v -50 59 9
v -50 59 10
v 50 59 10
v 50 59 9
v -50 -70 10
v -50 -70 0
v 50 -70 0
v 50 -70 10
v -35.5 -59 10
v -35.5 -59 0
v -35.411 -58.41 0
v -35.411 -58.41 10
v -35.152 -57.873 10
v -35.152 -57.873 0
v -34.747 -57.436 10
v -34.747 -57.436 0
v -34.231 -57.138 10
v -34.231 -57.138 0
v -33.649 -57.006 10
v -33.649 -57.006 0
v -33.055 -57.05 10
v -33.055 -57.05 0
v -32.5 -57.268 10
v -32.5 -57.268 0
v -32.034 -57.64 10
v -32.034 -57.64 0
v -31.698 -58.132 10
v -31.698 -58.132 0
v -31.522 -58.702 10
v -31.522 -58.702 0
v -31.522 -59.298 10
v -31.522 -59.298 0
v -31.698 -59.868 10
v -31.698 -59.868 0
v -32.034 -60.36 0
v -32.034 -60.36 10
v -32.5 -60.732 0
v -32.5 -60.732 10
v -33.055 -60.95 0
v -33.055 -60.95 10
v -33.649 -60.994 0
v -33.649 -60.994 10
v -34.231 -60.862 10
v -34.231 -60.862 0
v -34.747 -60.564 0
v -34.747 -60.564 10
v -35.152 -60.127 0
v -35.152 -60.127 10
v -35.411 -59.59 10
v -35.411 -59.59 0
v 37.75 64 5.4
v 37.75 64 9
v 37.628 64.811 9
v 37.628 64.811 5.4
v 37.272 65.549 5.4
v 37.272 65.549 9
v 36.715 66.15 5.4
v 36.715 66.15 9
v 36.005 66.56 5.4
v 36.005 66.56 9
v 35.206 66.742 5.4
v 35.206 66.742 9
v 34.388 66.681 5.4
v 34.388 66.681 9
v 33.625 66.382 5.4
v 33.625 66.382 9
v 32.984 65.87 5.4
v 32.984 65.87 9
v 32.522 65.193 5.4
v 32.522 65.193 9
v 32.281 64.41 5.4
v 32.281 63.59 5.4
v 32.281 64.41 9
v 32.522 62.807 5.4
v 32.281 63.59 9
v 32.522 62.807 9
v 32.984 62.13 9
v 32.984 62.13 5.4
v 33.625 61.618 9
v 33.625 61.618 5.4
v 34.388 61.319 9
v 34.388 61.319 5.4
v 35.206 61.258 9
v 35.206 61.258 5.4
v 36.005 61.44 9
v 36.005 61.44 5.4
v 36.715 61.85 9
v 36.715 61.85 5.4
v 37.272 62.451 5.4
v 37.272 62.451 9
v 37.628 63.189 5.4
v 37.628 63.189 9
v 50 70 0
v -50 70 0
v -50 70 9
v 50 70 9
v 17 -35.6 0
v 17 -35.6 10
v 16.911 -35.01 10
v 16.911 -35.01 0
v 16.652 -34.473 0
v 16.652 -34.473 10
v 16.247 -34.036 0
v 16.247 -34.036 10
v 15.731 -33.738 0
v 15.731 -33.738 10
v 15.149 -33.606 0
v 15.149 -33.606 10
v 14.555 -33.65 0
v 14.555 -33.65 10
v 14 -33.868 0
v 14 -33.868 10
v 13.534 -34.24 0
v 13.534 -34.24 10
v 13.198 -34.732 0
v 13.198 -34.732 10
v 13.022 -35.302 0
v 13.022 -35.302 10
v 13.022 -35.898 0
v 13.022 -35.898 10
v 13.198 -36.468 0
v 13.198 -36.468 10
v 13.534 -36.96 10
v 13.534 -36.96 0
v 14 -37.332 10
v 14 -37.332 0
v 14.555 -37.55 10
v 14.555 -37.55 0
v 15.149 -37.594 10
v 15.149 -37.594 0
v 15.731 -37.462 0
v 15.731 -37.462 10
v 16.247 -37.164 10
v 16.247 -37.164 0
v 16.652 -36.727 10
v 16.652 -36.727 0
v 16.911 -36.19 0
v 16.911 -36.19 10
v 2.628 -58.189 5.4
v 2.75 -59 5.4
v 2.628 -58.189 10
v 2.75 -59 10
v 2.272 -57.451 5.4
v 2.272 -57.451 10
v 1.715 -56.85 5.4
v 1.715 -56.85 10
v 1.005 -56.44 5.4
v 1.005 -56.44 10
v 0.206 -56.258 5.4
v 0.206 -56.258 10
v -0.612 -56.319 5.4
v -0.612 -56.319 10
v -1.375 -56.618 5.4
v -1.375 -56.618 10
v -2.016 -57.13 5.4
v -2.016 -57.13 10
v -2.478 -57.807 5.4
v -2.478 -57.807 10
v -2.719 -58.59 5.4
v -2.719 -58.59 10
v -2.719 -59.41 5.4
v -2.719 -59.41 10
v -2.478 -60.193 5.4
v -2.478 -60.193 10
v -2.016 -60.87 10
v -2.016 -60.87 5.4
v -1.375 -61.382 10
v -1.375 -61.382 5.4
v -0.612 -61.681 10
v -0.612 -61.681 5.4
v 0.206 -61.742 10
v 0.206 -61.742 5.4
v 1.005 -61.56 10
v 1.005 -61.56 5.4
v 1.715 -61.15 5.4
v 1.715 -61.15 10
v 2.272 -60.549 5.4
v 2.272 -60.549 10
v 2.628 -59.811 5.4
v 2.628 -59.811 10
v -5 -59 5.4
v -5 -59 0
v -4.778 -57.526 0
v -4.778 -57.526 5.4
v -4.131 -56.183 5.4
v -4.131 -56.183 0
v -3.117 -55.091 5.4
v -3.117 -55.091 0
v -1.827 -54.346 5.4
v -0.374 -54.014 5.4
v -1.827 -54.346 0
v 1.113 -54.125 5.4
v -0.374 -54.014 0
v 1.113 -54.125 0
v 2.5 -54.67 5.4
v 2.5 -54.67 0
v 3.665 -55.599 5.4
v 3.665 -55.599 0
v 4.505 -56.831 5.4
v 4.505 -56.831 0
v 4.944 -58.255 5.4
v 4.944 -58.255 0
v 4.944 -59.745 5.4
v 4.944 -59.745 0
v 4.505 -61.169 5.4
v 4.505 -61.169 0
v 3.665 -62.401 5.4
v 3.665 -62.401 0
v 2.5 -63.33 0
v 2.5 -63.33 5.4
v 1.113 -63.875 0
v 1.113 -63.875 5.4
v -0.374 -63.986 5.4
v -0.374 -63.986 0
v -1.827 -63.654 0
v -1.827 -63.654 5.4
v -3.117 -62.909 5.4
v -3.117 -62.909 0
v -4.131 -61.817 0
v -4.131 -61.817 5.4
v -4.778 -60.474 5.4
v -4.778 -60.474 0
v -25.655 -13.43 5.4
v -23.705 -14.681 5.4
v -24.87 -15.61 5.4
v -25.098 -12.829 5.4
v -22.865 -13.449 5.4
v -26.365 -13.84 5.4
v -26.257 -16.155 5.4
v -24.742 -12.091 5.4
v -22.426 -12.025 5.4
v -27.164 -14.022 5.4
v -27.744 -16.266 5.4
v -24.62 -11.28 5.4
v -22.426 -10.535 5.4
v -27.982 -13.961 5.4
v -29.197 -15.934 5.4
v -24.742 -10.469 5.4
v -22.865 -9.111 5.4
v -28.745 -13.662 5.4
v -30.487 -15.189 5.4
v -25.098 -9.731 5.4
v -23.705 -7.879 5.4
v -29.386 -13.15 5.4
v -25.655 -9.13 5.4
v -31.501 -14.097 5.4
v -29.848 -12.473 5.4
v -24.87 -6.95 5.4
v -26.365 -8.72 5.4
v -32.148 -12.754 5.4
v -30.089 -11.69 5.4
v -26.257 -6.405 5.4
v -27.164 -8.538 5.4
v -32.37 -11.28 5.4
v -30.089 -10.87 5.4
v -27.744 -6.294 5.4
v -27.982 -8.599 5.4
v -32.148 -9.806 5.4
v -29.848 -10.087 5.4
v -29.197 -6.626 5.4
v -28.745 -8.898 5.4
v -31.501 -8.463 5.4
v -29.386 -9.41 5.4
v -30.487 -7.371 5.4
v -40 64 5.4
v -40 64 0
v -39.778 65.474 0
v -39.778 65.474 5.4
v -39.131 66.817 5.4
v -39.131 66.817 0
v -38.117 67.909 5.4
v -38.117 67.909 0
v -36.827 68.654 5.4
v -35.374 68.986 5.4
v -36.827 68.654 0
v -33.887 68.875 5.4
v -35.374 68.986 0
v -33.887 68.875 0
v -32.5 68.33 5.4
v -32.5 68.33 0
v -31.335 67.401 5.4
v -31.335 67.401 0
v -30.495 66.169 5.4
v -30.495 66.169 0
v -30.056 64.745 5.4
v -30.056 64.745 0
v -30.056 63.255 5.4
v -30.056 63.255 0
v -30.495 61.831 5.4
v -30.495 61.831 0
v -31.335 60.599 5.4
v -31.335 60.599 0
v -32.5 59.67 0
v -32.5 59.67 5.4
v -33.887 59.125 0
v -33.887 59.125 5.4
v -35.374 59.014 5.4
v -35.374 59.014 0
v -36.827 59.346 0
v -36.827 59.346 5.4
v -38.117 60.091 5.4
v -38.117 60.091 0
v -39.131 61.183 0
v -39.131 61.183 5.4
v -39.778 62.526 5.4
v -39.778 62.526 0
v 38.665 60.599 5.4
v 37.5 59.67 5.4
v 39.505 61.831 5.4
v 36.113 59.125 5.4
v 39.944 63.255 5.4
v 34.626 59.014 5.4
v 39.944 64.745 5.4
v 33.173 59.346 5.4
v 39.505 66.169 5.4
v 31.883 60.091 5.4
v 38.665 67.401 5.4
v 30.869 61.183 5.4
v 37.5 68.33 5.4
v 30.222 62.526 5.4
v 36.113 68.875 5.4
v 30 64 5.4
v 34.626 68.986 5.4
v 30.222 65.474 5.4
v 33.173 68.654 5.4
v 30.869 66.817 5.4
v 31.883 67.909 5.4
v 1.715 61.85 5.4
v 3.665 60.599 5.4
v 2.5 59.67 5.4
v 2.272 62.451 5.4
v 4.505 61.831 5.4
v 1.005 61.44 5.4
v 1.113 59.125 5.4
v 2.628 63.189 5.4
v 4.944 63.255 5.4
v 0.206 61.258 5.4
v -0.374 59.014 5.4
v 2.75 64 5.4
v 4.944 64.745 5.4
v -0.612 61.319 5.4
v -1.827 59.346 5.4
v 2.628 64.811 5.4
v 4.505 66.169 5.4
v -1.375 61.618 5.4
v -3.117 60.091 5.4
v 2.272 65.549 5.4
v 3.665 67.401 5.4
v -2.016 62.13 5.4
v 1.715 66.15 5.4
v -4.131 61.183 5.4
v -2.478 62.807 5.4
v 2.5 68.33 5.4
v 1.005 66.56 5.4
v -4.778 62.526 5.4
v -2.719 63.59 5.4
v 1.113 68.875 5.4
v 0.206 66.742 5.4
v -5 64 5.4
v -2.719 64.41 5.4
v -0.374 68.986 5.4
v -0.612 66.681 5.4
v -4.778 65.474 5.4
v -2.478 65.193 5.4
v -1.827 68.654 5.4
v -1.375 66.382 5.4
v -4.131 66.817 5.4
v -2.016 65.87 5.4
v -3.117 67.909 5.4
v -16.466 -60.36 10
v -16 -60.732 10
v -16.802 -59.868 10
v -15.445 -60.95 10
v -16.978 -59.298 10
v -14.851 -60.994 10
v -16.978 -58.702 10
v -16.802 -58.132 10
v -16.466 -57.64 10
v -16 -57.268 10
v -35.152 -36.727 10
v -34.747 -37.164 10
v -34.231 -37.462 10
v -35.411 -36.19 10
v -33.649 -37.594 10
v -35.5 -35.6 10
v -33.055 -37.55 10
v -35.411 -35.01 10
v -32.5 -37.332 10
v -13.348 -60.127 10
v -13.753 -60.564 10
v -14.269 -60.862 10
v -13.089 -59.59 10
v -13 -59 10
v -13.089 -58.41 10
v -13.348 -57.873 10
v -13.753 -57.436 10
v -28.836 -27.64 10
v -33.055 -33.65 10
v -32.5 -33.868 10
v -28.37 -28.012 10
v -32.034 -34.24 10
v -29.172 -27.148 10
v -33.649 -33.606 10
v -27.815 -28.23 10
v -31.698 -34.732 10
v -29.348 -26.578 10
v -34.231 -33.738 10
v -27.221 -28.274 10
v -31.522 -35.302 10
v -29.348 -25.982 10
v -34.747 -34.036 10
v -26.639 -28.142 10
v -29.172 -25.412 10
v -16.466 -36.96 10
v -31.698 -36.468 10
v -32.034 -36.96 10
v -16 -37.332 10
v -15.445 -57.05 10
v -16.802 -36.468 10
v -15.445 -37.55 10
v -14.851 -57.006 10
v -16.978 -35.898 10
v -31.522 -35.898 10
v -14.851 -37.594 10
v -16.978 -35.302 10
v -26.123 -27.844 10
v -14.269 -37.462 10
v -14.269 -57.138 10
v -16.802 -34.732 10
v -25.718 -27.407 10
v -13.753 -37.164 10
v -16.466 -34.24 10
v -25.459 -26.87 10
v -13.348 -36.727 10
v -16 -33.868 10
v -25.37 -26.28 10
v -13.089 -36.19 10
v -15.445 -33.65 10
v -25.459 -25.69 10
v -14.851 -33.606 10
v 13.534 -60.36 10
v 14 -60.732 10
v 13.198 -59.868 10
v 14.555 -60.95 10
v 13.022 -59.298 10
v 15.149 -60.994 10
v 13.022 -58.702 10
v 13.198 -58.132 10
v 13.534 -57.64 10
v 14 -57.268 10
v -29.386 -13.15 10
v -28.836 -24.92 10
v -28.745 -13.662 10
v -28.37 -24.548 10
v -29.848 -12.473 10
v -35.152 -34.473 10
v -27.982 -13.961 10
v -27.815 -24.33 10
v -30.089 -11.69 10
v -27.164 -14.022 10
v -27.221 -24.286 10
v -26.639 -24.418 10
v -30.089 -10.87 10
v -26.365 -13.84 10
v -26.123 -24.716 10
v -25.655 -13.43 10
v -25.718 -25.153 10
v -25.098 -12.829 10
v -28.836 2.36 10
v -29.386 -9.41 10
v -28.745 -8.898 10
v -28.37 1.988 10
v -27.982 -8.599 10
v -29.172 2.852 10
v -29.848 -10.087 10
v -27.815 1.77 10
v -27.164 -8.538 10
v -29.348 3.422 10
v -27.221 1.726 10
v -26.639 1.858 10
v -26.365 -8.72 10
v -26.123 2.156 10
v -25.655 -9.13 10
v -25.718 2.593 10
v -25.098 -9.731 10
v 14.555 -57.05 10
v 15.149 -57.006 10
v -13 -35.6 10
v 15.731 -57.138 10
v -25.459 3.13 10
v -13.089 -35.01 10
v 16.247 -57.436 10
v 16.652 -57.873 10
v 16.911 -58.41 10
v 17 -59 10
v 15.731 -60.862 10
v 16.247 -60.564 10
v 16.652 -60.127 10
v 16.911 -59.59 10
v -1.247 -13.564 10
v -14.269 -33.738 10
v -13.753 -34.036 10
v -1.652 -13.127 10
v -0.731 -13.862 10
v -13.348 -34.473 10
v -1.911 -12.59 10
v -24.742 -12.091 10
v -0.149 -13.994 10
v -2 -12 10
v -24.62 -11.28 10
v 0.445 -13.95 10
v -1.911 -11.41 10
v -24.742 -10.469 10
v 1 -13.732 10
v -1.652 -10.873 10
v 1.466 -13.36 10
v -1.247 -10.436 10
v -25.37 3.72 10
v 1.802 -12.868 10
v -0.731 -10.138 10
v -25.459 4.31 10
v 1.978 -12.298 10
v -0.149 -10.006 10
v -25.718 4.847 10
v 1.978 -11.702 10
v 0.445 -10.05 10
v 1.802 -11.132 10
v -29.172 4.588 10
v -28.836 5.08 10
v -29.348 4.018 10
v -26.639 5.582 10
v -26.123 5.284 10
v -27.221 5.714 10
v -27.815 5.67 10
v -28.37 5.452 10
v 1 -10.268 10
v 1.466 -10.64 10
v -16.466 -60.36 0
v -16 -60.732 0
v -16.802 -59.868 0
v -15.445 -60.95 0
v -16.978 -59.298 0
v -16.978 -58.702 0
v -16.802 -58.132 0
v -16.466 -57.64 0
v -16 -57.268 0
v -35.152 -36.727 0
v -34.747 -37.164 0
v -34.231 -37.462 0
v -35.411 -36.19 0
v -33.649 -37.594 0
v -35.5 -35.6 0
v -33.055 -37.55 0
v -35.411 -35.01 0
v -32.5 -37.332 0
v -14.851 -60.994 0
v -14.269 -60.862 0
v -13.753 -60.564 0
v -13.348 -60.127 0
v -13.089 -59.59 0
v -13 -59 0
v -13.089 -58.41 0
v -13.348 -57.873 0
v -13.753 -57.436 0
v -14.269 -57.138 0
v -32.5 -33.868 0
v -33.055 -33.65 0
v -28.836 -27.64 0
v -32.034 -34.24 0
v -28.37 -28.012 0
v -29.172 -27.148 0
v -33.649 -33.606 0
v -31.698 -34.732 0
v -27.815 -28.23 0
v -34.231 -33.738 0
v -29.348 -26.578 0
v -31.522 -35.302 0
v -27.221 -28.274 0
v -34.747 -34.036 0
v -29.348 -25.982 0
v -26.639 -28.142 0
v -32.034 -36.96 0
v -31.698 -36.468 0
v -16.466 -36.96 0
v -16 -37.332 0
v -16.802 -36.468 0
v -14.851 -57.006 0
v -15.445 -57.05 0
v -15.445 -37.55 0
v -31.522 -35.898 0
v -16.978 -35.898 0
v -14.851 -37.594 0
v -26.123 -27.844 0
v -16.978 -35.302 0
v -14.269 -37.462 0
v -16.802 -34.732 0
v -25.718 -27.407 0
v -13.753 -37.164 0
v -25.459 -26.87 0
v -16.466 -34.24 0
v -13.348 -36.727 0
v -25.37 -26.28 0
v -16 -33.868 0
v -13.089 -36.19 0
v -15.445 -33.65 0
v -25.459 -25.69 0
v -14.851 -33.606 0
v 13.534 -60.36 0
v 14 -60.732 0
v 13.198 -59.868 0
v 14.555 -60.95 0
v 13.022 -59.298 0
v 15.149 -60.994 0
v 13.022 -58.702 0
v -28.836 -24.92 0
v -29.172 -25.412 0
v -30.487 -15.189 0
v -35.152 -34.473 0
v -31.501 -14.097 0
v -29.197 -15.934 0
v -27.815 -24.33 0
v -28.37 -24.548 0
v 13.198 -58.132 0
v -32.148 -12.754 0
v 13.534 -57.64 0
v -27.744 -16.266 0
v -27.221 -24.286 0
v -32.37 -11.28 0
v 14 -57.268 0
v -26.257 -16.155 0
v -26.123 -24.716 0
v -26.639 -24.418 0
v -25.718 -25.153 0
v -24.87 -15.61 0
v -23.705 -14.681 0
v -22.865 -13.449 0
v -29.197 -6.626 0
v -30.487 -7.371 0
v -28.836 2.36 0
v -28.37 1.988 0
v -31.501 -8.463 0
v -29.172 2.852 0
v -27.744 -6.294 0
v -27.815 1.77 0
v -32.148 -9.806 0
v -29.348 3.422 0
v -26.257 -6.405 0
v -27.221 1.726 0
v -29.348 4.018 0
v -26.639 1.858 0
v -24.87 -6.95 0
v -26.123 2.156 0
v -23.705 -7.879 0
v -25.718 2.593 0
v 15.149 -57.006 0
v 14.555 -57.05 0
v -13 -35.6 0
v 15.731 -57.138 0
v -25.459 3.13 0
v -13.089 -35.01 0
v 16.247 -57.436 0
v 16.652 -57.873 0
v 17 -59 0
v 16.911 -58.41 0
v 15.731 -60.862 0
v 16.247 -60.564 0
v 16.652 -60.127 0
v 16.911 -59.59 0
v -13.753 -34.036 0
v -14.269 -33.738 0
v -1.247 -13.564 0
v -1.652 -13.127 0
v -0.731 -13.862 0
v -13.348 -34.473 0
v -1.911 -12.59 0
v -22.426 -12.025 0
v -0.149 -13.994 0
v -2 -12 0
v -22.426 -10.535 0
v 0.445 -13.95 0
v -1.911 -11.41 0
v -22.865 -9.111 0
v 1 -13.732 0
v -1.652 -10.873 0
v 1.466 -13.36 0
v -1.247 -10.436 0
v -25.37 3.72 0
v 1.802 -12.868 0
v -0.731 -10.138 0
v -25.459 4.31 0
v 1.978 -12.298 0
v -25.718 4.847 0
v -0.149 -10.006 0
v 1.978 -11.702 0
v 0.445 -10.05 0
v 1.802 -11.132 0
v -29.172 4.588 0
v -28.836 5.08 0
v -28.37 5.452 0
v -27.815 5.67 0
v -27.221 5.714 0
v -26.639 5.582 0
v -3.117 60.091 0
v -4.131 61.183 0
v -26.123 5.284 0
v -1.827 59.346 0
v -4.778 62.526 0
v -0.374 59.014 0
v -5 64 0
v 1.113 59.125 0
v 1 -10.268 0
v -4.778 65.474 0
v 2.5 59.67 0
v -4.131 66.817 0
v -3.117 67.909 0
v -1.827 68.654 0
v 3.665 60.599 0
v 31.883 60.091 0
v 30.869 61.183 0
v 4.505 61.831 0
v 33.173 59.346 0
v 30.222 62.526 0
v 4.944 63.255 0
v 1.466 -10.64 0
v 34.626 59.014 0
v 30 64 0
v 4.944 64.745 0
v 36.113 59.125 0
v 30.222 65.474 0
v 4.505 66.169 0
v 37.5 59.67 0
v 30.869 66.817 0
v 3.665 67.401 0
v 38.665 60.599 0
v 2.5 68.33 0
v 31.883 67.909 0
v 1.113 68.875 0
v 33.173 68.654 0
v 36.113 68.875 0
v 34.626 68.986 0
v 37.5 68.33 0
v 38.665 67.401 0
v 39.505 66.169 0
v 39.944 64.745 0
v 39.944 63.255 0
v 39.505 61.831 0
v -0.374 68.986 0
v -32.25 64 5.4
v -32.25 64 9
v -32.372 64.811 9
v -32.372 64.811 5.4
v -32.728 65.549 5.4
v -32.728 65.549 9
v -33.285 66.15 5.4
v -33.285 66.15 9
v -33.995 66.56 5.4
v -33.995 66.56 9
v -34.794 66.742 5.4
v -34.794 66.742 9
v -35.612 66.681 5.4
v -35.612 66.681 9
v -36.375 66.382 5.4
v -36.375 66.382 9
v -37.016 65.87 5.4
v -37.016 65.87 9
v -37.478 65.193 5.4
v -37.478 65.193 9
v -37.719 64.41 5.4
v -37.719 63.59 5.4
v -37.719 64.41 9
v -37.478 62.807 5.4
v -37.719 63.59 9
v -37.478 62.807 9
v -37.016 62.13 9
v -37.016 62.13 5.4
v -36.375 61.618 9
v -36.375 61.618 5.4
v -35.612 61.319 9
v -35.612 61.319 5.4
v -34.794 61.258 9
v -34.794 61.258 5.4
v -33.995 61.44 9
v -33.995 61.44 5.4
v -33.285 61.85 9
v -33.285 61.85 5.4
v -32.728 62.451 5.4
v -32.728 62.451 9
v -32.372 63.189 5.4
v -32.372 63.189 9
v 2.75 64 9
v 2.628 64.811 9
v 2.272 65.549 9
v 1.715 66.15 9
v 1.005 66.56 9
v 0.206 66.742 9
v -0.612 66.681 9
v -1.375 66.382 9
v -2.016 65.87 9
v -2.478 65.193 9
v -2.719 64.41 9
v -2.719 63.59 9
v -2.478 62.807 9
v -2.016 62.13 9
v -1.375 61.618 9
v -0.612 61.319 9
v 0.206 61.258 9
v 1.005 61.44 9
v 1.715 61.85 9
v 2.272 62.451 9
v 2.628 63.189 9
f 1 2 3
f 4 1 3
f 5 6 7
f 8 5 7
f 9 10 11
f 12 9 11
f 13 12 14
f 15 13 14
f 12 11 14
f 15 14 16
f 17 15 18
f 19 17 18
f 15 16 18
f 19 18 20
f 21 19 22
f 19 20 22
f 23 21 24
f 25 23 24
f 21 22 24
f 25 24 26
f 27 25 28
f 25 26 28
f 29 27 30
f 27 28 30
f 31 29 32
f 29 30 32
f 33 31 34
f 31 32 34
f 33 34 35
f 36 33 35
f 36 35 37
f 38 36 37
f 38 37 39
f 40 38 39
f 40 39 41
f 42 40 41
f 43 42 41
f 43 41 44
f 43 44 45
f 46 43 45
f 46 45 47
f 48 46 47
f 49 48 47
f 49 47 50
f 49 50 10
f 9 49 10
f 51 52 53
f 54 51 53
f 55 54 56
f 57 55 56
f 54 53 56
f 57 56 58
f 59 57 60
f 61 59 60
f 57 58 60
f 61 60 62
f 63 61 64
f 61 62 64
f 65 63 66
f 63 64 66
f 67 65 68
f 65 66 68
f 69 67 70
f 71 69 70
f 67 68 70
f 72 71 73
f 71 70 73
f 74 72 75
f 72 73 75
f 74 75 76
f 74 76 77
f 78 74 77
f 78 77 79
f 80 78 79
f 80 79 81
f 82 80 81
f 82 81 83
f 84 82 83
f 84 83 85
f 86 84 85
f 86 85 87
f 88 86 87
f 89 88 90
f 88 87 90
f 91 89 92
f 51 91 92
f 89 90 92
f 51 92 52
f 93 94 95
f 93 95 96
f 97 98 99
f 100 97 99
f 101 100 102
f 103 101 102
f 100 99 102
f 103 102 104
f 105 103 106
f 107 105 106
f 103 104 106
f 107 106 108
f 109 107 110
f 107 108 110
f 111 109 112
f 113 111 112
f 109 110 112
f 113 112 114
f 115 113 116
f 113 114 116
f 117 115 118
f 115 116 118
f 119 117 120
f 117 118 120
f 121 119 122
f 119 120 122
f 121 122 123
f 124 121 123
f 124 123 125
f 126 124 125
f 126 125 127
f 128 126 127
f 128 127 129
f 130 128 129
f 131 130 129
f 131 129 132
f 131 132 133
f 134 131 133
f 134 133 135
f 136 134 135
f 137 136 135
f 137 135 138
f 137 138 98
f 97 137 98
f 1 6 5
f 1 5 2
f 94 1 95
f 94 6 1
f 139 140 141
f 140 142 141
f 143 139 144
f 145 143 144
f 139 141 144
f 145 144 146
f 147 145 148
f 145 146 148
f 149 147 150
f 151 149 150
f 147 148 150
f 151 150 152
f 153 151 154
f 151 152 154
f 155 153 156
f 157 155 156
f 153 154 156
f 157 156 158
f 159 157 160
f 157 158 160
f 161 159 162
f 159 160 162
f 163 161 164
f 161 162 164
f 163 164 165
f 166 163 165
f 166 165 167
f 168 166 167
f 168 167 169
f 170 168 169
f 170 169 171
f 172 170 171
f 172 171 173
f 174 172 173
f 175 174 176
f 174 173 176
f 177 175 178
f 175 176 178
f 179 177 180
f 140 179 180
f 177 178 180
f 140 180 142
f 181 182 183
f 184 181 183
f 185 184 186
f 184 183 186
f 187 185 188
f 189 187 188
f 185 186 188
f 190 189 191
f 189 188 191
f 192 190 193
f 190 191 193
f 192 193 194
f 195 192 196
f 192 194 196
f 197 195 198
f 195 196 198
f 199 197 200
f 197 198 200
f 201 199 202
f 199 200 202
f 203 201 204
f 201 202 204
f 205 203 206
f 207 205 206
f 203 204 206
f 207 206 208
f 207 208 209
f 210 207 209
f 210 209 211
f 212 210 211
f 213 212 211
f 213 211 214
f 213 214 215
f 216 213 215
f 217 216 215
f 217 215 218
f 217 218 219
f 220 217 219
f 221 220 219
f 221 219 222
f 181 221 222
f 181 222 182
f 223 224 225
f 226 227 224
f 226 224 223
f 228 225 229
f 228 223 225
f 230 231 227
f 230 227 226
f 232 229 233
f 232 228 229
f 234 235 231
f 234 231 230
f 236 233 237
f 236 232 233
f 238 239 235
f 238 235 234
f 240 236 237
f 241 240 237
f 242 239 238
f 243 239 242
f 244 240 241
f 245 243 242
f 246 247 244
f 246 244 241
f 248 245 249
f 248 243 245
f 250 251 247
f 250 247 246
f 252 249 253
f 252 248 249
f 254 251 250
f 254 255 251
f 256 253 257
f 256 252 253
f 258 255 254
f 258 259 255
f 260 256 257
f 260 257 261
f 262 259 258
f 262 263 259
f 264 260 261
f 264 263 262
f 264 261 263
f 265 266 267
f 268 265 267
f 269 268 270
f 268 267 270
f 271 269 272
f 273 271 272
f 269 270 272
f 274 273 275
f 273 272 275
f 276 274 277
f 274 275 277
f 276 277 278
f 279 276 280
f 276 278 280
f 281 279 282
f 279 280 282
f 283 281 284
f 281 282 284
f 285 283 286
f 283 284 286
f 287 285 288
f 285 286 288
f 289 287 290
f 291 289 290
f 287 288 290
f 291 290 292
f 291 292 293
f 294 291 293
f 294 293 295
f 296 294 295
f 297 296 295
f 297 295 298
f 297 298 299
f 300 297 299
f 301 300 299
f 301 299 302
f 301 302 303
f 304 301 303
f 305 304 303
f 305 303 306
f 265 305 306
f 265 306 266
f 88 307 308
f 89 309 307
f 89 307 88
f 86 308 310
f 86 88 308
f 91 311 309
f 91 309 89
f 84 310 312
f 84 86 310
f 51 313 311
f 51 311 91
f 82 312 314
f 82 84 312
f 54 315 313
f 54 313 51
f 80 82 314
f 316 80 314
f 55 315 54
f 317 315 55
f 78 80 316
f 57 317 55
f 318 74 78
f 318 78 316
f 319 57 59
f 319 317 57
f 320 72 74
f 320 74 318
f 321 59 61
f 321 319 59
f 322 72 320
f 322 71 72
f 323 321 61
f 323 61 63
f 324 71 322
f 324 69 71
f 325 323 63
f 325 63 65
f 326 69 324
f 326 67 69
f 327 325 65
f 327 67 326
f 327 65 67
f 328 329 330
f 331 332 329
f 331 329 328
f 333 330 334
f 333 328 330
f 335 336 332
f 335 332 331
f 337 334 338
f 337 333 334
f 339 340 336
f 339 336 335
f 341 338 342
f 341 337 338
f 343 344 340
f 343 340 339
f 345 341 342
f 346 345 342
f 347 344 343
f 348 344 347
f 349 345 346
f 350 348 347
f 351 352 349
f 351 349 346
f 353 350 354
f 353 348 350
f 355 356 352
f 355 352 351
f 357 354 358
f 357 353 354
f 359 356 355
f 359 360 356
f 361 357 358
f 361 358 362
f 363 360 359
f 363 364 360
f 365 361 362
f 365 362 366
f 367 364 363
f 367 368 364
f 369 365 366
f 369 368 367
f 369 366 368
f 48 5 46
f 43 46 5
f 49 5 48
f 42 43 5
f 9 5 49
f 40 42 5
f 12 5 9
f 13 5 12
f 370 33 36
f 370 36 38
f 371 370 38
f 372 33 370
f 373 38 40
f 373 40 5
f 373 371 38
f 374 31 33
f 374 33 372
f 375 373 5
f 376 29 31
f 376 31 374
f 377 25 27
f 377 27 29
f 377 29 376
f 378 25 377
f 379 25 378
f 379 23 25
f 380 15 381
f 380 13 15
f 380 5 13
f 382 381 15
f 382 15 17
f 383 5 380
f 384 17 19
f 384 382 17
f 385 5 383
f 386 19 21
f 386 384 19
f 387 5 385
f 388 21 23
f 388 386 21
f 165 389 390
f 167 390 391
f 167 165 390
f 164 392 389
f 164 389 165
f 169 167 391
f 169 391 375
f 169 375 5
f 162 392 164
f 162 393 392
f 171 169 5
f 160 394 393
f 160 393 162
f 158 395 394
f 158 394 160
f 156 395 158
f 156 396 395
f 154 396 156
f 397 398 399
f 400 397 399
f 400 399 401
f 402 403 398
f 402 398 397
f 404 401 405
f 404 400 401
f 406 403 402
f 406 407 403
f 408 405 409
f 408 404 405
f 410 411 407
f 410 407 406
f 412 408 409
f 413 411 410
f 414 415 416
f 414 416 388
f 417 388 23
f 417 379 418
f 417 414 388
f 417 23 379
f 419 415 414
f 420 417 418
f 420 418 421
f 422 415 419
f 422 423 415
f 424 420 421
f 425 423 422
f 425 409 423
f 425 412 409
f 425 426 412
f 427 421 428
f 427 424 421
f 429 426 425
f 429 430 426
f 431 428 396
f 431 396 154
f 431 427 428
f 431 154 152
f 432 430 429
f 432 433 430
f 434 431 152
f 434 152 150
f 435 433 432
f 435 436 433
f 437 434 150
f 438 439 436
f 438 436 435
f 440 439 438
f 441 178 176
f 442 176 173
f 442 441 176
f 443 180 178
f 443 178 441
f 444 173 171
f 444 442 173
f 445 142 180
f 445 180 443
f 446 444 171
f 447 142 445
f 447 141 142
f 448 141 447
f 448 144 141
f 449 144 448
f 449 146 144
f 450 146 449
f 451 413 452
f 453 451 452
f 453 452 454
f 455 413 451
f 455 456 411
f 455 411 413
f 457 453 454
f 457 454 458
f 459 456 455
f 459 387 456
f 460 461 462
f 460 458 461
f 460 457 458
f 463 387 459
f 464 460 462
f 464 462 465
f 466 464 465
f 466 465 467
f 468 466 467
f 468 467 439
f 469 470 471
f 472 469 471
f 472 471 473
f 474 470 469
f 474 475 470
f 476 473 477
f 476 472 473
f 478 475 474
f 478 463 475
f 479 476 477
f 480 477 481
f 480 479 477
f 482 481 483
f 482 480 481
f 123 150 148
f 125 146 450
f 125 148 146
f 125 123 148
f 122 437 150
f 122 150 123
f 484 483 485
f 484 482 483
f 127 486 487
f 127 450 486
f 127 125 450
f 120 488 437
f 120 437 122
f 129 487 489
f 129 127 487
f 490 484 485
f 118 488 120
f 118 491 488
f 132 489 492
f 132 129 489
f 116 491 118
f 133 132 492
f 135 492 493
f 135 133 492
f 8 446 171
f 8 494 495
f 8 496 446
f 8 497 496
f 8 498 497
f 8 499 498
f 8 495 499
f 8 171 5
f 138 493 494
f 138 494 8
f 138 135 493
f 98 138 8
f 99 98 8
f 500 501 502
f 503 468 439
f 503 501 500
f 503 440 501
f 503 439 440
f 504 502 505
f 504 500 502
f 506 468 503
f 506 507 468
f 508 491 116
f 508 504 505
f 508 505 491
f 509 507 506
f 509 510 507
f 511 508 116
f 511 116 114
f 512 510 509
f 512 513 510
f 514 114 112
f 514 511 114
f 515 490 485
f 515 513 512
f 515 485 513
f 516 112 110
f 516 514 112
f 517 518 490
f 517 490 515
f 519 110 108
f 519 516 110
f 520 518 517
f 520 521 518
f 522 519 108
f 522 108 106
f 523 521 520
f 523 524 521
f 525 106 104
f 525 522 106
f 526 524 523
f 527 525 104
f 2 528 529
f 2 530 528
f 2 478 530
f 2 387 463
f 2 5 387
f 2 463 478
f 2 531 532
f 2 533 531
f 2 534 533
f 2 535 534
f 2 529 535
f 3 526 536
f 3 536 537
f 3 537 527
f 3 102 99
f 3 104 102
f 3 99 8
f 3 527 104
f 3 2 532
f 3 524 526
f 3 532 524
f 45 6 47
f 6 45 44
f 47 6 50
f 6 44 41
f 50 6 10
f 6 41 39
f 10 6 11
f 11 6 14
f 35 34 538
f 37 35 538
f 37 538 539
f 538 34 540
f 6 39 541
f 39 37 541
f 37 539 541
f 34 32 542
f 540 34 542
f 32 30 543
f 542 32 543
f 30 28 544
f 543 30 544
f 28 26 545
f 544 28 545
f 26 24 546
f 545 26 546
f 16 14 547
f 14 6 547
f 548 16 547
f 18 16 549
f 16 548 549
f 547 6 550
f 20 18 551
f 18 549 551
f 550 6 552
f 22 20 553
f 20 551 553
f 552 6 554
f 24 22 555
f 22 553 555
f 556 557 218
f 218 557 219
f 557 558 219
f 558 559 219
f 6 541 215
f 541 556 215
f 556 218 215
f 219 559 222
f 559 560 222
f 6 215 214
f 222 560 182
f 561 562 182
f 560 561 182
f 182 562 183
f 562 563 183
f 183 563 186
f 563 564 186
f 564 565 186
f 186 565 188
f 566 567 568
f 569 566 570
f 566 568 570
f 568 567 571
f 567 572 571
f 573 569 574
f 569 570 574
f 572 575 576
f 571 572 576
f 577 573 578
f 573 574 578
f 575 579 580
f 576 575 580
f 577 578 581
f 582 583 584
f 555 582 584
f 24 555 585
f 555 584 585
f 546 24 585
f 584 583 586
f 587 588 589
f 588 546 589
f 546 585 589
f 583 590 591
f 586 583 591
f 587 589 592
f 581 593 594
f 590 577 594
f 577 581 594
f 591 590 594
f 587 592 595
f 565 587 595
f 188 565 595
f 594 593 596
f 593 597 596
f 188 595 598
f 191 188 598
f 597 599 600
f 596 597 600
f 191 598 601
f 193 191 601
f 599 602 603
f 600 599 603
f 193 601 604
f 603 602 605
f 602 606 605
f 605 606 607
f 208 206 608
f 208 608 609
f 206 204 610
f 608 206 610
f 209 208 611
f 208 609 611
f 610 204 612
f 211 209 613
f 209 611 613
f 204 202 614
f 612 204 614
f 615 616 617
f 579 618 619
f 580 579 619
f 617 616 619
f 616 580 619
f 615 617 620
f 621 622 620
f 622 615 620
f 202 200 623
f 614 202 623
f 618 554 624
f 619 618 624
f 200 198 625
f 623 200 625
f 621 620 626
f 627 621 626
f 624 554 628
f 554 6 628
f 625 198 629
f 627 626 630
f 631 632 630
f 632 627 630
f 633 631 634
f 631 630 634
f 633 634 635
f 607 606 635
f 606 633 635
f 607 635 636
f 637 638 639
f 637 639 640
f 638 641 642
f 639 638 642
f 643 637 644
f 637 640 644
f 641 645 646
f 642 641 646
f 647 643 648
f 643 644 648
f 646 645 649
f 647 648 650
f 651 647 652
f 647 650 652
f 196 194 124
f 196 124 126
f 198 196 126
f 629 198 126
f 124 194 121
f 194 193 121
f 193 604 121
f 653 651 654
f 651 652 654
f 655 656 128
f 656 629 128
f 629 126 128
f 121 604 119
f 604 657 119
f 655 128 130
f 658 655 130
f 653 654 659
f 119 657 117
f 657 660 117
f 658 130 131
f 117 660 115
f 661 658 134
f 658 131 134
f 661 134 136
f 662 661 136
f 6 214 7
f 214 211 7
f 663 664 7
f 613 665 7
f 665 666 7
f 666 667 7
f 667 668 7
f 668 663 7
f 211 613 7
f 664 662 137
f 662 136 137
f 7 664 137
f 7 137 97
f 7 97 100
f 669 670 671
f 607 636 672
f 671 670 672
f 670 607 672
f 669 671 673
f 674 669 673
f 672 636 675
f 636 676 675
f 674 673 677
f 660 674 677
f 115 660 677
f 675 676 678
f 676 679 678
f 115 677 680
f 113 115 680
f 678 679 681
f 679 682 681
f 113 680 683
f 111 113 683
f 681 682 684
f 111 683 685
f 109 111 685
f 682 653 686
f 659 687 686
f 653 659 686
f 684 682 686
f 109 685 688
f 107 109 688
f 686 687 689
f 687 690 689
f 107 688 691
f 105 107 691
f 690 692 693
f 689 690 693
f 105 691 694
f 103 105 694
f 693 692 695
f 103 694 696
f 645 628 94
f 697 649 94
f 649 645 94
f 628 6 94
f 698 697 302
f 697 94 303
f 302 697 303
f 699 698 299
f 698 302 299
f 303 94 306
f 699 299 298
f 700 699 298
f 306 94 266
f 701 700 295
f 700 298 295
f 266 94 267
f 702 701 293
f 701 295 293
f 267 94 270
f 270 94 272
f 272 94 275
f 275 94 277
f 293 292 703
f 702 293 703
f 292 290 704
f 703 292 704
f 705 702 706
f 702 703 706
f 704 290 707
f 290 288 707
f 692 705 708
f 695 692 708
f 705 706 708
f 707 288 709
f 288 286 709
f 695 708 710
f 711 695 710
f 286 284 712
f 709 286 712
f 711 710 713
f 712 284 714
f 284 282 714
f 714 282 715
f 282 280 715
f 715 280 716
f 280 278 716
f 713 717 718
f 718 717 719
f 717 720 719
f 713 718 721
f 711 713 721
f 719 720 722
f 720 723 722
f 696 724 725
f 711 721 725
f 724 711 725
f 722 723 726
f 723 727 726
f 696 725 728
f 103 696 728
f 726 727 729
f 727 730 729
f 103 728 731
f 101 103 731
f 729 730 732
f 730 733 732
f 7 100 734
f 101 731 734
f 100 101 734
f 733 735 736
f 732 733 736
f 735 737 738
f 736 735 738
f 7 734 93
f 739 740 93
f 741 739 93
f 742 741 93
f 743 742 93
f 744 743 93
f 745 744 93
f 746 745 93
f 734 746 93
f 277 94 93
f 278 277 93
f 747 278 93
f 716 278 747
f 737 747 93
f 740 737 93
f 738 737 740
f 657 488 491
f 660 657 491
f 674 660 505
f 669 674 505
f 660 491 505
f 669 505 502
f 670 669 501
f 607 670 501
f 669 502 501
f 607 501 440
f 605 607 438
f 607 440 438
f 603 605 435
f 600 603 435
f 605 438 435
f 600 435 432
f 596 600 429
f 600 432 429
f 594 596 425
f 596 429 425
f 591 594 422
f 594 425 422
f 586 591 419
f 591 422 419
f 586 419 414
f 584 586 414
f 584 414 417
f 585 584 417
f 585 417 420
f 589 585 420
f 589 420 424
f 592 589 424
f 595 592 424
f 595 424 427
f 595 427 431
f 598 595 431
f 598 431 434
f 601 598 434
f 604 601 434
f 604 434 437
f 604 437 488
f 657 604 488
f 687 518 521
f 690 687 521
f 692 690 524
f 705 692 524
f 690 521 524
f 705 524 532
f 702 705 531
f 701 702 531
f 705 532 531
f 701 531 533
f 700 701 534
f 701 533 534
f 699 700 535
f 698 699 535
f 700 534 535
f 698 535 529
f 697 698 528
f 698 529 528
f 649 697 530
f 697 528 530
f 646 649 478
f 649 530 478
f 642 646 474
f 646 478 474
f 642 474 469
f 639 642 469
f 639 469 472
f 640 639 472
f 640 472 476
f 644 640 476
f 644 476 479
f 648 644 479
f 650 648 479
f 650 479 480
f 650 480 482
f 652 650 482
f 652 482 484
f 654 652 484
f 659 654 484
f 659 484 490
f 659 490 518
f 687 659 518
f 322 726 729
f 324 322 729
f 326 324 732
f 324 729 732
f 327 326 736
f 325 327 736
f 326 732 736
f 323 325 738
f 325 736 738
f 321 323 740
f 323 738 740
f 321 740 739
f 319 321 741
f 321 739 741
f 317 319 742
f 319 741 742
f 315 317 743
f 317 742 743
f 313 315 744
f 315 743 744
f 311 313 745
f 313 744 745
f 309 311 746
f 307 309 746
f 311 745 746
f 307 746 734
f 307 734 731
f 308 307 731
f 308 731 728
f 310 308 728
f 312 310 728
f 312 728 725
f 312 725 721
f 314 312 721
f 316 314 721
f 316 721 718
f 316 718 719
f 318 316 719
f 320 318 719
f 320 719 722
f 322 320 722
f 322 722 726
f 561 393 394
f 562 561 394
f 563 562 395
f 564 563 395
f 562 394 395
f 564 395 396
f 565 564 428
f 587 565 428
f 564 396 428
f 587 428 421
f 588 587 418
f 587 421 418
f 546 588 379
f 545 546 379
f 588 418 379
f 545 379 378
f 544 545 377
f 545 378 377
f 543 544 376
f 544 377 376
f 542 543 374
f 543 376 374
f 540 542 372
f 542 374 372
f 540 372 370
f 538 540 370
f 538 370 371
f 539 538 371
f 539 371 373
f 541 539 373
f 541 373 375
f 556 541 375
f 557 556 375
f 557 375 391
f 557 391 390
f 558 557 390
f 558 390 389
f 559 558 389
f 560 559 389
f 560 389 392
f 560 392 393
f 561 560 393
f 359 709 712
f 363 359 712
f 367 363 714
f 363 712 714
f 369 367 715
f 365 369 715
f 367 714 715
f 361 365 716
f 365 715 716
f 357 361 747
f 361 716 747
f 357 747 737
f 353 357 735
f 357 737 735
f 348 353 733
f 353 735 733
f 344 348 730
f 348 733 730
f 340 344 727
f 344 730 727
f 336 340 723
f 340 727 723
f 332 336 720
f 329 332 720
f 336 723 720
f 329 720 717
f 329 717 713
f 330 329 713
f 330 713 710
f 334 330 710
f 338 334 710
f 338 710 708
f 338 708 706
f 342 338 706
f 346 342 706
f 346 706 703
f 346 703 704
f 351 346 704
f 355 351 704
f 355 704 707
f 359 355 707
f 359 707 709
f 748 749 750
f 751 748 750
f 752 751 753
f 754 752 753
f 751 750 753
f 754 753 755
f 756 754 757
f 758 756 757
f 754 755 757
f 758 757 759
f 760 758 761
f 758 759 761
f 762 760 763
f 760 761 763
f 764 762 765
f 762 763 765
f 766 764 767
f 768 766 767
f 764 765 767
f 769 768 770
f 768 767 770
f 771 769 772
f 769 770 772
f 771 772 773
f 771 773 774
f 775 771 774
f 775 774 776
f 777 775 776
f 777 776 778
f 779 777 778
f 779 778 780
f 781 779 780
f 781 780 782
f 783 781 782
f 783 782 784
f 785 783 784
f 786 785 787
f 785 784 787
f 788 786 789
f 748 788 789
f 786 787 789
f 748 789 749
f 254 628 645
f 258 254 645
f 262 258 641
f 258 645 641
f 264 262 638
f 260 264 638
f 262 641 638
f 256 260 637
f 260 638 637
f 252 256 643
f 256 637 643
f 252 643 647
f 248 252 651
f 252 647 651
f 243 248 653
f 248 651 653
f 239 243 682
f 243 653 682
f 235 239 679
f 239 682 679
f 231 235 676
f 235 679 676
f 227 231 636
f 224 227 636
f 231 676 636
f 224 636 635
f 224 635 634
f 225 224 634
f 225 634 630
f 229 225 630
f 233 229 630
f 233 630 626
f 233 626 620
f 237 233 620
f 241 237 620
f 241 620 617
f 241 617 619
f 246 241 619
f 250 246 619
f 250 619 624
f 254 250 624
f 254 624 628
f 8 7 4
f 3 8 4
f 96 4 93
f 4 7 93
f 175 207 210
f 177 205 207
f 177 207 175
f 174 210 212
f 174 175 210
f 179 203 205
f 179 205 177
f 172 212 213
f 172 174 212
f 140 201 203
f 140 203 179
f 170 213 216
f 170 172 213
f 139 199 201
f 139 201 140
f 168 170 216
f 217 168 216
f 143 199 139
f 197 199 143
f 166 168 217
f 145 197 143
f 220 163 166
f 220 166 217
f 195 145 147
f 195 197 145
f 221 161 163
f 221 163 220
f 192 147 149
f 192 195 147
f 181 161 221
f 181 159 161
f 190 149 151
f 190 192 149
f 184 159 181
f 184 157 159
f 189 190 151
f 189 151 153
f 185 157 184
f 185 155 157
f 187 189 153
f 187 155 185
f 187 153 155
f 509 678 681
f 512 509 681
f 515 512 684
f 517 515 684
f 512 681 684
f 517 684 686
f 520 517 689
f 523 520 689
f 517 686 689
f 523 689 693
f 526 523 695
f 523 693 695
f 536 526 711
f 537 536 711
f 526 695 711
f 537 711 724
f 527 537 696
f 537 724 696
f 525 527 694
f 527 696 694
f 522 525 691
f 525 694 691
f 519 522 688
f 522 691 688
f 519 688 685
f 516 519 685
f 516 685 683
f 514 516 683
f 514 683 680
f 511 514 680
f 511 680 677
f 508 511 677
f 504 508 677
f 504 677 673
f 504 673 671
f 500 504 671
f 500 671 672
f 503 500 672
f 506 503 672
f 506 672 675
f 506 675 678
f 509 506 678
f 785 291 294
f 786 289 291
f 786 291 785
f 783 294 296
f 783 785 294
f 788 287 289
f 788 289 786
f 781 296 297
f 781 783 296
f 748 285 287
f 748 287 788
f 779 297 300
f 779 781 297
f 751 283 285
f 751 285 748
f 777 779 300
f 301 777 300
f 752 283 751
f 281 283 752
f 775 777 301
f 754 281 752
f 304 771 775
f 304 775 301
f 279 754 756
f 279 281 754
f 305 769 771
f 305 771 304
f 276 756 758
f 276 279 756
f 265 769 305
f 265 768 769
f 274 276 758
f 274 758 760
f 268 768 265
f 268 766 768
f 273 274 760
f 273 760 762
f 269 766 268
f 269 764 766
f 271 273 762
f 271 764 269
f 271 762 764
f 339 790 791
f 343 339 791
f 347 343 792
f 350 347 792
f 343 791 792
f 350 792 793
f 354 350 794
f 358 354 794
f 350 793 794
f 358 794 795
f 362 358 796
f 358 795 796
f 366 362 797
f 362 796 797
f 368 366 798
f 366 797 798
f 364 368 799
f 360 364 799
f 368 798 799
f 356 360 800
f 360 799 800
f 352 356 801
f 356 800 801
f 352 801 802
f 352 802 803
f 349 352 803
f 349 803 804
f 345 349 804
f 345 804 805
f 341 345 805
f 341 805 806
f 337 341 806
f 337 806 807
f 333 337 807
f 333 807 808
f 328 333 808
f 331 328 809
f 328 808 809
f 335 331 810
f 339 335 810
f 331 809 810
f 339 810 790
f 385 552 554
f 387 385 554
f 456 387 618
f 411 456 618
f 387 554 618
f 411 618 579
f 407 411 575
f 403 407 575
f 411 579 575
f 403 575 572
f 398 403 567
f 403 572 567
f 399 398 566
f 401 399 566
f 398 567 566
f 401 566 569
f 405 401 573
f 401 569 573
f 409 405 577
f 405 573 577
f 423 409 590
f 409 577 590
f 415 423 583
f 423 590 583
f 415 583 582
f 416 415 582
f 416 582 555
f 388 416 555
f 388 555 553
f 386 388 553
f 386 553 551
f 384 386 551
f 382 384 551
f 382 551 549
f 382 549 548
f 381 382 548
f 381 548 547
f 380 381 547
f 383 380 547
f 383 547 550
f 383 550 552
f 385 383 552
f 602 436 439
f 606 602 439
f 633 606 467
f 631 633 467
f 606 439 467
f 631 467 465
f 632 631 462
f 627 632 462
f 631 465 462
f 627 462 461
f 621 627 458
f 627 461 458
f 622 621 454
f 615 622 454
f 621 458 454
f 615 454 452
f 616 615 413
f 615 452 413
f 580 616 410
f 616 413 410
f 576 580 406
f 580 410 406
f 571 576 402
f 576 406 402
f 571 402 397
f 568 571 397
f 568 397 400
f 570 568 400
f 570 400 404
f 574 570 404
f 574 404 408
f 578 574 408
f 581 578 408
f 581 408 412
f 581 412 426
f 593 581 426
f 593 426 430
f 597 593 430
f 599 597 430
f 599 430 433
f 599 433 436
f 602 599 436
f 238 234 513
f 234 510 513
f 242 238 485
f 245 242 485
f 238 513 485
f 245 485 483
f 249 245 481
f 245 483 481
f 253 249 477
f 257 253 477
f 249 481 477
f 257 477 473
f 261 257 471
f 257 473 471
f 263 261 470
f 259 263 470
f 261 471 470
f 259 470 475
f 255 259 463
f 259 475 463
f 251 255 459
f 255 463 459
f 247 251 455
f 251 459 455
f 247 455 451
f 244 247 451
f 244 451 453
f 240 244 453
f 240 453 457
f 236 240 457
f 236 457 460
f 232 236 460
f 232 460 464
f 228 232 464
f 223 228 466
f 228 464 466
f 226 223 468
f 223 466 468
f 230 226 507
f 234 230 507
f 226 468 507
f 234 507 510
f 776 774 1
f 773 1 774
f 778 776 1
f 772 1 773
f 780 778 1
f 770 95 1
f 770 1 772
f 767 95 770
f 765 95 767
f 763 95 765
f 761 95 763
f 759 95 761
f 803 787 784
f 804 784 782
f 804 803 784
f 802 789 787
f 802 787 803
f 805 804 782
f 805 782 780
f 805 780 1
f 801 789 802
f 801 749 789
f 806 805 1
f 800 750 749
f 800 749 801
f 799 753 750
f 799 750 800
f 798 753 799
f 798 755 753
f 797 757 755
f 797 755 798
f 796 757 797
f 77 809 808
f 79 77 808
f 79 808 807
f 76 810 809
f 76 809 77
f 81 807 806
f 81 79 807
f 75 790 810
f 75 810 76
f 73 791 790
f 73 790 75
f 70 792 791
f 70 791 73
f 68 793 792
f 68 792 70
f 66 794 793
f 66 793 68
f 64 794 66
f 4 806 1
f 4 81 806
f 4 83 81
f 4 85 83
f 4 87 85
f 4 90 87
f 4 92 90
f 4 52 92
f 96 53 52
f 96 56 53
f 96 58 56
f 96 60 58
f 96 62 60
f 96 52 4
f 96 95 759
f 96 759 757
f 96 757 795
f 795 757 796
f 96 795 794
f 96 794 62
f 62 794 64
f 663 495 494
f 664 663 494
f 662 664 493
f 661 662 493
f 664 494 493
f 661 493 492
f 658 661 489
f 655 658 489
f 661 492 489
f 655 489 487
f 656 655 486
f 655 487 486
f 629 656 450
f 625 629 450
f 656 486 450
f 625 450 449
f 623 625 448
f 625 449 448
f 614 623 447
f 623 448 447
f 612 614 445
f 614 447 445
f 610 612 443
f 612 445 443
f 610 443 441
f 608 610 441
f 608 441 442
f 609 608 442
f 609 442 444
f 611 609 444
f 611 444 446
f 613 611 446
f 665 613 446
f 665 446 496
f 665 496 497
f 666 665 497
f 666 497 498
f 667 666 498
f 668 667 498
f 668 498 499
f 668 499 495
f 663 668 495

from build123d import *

# Parameters (mm, degrees)
SKIZZE1_W                                            = 100
SKIZZE1_H                                            = 140
AUFSATZ_LINEAR_AUSTRAGEN1_DEPTH                      = 10
STIRNSENKUNG_F_R_M5_ZYLINDERSCHRAUBE_MIT_D           = 5.5
STIRNSENKUNG_F_R_M5_ZYLINDERSCHRAUBE_MIT_CBORE_D     = 10
STIRNSENKUNG_F_R_M5_ZYLINDERSCHRAUBE_MIT_CBORE_DEPTH = 5.4
SKIZZE8_W                                            = 100
SKIZZE8_H                                            = 11
SCHNITT_LINEAR_AUSTRAGEN1_DEPTH                      = 1
STIRNSENKUNG_F_R_M5_ZYLINDERSCHRAUBE_2_D             = 5.5
STIRNSENKUNG_F_R_M5_ZYLINDERSCHRAUBE_2_CBORE_D       = 10
STIRNSENKUNG_F_R_M5_ZYLINDERSCHRAUBE_2_CBORE_DEPTH   = 5.4
F_4_0_4_DURCHMESSER_BOHRUNG1_D                       = 4
F_4_0_4_DURCHMESSER_BOHRUNG2_D                       = 4
F_4_0_4_DURCHMESSER_BOHRUNG3_D                       = 4
F_4_0_4_DURCHMESSER_BOHRUNG4_D                       = 4


with BuildPart() as part:
    # Skizze1 → Aufsatz-Linear austragen1 (new body)
    with BuildSketch(Plane.XY):
        Rectangle(SKIZZE1_W, SKIZZE1_H)
    extrude(amount=AUFSATZ_LINEAR_AUSTRAGEN1_DEPTH)

    # Stirnsenkung f_r M5 Zylinderschraube mit (through all)
    with Locations(Plane(origin=(0, 0, 0), x_dir=(-1, 0, 0), z_dir=(0, 0, -1))):
        with Locations((0, 64), (35, 64), (-35, 64)):
            CounterBoreHole(STIRNSENKUNG_F_R_M5_ZYLINDERSCHRAUBE_MIT_D / 2, STIRNSENKUNG_F_R_M5_ZYLINDERSCHRAUBE_MIT_CBORE_D / 2, STIRNSENKUNG_F_R_M5_ZYLINDERSCHRAUBE_MIT_CBORE_DEPTH)

    # Skizze8 → Schnitt-Linear austragen1 (cut)
    with BuildSketch(Plane.XY.offset(10)):
        with Locations((0, 64.5)):
            Rectangle(SKIZZE8_W, SKIZZE8_H)
    extrude(amount=-SCHNITT_LINEAR_AUSTRAGEN1_DEPTH, mode=Mode.SUBTRACT)

    # Stirnsenkung f_r M5 Zylinderschraube 2 (through all)
    with Locations(Plane(origin=(0, 0, 0), x_dir=(-1, 0, 0), z_dir=(0, 0, -1))):
        with Locations((0, -59), (27.37, -11.28)):
            CounterBoreHole(STIRNSENKUNG_F_R_M5_ZYLINDERSCHRAUBE_2_D / 2, STIRNSENKUNG_F_R_M5_ZYLINDERSCHRAUBE_2_CBORE_D / 2, STIRNSENKUNG_F_R_M5_ZYLINDERSCHRAUBE_2_CBORE_DEPTH)

    # Ø4.0 (4) Durchmesser Bohrung1 (through all)
    with Locations(Plane(origin=(0, 0, 0), x_dir=(-1, 0, 0), z_dir=(0, 0, -1))):
        with Locations((15, -59), (-15, -59), (27.37, -26.28), (27.37, 3.72)):
            Hole(F_4_0_4_DURCHMESSER_BOHRUNG1_D / 2)

    # Ø4.0 (4) Durchmesser Bohrung2 (through all)
    with Locations(Plane(origin=(0, 0, 0), x_dir=(-1, 0, 0), z_dir=(0, 0, -1))):
        with Locations((15, -35.6), (-15, -35.6)):
            Hole(F_4_0_4_DURCHMESSER_BOHRUNG2_D / 2)

    # Ø4.0 (4) Durchmesser Bohrung3 (through all)
    with Locations(Plane.XY.offset(10)):
        with Locations((-33.5, -35.6), (-33.5, -59)):
            Hole(F_4_0_4_DURCHMESSER_BOHRUNG3_D / 2)

    # Ø4.0 (4) Durchmesser Bohrung4 (through all)
    with Locations(Plane.XY.offset(10)):
        with Locations((0, -12)):
            Hole(F_4_0_4_DURCHMESSER_BOHRUNG4_D / 2)


solid = part.part
